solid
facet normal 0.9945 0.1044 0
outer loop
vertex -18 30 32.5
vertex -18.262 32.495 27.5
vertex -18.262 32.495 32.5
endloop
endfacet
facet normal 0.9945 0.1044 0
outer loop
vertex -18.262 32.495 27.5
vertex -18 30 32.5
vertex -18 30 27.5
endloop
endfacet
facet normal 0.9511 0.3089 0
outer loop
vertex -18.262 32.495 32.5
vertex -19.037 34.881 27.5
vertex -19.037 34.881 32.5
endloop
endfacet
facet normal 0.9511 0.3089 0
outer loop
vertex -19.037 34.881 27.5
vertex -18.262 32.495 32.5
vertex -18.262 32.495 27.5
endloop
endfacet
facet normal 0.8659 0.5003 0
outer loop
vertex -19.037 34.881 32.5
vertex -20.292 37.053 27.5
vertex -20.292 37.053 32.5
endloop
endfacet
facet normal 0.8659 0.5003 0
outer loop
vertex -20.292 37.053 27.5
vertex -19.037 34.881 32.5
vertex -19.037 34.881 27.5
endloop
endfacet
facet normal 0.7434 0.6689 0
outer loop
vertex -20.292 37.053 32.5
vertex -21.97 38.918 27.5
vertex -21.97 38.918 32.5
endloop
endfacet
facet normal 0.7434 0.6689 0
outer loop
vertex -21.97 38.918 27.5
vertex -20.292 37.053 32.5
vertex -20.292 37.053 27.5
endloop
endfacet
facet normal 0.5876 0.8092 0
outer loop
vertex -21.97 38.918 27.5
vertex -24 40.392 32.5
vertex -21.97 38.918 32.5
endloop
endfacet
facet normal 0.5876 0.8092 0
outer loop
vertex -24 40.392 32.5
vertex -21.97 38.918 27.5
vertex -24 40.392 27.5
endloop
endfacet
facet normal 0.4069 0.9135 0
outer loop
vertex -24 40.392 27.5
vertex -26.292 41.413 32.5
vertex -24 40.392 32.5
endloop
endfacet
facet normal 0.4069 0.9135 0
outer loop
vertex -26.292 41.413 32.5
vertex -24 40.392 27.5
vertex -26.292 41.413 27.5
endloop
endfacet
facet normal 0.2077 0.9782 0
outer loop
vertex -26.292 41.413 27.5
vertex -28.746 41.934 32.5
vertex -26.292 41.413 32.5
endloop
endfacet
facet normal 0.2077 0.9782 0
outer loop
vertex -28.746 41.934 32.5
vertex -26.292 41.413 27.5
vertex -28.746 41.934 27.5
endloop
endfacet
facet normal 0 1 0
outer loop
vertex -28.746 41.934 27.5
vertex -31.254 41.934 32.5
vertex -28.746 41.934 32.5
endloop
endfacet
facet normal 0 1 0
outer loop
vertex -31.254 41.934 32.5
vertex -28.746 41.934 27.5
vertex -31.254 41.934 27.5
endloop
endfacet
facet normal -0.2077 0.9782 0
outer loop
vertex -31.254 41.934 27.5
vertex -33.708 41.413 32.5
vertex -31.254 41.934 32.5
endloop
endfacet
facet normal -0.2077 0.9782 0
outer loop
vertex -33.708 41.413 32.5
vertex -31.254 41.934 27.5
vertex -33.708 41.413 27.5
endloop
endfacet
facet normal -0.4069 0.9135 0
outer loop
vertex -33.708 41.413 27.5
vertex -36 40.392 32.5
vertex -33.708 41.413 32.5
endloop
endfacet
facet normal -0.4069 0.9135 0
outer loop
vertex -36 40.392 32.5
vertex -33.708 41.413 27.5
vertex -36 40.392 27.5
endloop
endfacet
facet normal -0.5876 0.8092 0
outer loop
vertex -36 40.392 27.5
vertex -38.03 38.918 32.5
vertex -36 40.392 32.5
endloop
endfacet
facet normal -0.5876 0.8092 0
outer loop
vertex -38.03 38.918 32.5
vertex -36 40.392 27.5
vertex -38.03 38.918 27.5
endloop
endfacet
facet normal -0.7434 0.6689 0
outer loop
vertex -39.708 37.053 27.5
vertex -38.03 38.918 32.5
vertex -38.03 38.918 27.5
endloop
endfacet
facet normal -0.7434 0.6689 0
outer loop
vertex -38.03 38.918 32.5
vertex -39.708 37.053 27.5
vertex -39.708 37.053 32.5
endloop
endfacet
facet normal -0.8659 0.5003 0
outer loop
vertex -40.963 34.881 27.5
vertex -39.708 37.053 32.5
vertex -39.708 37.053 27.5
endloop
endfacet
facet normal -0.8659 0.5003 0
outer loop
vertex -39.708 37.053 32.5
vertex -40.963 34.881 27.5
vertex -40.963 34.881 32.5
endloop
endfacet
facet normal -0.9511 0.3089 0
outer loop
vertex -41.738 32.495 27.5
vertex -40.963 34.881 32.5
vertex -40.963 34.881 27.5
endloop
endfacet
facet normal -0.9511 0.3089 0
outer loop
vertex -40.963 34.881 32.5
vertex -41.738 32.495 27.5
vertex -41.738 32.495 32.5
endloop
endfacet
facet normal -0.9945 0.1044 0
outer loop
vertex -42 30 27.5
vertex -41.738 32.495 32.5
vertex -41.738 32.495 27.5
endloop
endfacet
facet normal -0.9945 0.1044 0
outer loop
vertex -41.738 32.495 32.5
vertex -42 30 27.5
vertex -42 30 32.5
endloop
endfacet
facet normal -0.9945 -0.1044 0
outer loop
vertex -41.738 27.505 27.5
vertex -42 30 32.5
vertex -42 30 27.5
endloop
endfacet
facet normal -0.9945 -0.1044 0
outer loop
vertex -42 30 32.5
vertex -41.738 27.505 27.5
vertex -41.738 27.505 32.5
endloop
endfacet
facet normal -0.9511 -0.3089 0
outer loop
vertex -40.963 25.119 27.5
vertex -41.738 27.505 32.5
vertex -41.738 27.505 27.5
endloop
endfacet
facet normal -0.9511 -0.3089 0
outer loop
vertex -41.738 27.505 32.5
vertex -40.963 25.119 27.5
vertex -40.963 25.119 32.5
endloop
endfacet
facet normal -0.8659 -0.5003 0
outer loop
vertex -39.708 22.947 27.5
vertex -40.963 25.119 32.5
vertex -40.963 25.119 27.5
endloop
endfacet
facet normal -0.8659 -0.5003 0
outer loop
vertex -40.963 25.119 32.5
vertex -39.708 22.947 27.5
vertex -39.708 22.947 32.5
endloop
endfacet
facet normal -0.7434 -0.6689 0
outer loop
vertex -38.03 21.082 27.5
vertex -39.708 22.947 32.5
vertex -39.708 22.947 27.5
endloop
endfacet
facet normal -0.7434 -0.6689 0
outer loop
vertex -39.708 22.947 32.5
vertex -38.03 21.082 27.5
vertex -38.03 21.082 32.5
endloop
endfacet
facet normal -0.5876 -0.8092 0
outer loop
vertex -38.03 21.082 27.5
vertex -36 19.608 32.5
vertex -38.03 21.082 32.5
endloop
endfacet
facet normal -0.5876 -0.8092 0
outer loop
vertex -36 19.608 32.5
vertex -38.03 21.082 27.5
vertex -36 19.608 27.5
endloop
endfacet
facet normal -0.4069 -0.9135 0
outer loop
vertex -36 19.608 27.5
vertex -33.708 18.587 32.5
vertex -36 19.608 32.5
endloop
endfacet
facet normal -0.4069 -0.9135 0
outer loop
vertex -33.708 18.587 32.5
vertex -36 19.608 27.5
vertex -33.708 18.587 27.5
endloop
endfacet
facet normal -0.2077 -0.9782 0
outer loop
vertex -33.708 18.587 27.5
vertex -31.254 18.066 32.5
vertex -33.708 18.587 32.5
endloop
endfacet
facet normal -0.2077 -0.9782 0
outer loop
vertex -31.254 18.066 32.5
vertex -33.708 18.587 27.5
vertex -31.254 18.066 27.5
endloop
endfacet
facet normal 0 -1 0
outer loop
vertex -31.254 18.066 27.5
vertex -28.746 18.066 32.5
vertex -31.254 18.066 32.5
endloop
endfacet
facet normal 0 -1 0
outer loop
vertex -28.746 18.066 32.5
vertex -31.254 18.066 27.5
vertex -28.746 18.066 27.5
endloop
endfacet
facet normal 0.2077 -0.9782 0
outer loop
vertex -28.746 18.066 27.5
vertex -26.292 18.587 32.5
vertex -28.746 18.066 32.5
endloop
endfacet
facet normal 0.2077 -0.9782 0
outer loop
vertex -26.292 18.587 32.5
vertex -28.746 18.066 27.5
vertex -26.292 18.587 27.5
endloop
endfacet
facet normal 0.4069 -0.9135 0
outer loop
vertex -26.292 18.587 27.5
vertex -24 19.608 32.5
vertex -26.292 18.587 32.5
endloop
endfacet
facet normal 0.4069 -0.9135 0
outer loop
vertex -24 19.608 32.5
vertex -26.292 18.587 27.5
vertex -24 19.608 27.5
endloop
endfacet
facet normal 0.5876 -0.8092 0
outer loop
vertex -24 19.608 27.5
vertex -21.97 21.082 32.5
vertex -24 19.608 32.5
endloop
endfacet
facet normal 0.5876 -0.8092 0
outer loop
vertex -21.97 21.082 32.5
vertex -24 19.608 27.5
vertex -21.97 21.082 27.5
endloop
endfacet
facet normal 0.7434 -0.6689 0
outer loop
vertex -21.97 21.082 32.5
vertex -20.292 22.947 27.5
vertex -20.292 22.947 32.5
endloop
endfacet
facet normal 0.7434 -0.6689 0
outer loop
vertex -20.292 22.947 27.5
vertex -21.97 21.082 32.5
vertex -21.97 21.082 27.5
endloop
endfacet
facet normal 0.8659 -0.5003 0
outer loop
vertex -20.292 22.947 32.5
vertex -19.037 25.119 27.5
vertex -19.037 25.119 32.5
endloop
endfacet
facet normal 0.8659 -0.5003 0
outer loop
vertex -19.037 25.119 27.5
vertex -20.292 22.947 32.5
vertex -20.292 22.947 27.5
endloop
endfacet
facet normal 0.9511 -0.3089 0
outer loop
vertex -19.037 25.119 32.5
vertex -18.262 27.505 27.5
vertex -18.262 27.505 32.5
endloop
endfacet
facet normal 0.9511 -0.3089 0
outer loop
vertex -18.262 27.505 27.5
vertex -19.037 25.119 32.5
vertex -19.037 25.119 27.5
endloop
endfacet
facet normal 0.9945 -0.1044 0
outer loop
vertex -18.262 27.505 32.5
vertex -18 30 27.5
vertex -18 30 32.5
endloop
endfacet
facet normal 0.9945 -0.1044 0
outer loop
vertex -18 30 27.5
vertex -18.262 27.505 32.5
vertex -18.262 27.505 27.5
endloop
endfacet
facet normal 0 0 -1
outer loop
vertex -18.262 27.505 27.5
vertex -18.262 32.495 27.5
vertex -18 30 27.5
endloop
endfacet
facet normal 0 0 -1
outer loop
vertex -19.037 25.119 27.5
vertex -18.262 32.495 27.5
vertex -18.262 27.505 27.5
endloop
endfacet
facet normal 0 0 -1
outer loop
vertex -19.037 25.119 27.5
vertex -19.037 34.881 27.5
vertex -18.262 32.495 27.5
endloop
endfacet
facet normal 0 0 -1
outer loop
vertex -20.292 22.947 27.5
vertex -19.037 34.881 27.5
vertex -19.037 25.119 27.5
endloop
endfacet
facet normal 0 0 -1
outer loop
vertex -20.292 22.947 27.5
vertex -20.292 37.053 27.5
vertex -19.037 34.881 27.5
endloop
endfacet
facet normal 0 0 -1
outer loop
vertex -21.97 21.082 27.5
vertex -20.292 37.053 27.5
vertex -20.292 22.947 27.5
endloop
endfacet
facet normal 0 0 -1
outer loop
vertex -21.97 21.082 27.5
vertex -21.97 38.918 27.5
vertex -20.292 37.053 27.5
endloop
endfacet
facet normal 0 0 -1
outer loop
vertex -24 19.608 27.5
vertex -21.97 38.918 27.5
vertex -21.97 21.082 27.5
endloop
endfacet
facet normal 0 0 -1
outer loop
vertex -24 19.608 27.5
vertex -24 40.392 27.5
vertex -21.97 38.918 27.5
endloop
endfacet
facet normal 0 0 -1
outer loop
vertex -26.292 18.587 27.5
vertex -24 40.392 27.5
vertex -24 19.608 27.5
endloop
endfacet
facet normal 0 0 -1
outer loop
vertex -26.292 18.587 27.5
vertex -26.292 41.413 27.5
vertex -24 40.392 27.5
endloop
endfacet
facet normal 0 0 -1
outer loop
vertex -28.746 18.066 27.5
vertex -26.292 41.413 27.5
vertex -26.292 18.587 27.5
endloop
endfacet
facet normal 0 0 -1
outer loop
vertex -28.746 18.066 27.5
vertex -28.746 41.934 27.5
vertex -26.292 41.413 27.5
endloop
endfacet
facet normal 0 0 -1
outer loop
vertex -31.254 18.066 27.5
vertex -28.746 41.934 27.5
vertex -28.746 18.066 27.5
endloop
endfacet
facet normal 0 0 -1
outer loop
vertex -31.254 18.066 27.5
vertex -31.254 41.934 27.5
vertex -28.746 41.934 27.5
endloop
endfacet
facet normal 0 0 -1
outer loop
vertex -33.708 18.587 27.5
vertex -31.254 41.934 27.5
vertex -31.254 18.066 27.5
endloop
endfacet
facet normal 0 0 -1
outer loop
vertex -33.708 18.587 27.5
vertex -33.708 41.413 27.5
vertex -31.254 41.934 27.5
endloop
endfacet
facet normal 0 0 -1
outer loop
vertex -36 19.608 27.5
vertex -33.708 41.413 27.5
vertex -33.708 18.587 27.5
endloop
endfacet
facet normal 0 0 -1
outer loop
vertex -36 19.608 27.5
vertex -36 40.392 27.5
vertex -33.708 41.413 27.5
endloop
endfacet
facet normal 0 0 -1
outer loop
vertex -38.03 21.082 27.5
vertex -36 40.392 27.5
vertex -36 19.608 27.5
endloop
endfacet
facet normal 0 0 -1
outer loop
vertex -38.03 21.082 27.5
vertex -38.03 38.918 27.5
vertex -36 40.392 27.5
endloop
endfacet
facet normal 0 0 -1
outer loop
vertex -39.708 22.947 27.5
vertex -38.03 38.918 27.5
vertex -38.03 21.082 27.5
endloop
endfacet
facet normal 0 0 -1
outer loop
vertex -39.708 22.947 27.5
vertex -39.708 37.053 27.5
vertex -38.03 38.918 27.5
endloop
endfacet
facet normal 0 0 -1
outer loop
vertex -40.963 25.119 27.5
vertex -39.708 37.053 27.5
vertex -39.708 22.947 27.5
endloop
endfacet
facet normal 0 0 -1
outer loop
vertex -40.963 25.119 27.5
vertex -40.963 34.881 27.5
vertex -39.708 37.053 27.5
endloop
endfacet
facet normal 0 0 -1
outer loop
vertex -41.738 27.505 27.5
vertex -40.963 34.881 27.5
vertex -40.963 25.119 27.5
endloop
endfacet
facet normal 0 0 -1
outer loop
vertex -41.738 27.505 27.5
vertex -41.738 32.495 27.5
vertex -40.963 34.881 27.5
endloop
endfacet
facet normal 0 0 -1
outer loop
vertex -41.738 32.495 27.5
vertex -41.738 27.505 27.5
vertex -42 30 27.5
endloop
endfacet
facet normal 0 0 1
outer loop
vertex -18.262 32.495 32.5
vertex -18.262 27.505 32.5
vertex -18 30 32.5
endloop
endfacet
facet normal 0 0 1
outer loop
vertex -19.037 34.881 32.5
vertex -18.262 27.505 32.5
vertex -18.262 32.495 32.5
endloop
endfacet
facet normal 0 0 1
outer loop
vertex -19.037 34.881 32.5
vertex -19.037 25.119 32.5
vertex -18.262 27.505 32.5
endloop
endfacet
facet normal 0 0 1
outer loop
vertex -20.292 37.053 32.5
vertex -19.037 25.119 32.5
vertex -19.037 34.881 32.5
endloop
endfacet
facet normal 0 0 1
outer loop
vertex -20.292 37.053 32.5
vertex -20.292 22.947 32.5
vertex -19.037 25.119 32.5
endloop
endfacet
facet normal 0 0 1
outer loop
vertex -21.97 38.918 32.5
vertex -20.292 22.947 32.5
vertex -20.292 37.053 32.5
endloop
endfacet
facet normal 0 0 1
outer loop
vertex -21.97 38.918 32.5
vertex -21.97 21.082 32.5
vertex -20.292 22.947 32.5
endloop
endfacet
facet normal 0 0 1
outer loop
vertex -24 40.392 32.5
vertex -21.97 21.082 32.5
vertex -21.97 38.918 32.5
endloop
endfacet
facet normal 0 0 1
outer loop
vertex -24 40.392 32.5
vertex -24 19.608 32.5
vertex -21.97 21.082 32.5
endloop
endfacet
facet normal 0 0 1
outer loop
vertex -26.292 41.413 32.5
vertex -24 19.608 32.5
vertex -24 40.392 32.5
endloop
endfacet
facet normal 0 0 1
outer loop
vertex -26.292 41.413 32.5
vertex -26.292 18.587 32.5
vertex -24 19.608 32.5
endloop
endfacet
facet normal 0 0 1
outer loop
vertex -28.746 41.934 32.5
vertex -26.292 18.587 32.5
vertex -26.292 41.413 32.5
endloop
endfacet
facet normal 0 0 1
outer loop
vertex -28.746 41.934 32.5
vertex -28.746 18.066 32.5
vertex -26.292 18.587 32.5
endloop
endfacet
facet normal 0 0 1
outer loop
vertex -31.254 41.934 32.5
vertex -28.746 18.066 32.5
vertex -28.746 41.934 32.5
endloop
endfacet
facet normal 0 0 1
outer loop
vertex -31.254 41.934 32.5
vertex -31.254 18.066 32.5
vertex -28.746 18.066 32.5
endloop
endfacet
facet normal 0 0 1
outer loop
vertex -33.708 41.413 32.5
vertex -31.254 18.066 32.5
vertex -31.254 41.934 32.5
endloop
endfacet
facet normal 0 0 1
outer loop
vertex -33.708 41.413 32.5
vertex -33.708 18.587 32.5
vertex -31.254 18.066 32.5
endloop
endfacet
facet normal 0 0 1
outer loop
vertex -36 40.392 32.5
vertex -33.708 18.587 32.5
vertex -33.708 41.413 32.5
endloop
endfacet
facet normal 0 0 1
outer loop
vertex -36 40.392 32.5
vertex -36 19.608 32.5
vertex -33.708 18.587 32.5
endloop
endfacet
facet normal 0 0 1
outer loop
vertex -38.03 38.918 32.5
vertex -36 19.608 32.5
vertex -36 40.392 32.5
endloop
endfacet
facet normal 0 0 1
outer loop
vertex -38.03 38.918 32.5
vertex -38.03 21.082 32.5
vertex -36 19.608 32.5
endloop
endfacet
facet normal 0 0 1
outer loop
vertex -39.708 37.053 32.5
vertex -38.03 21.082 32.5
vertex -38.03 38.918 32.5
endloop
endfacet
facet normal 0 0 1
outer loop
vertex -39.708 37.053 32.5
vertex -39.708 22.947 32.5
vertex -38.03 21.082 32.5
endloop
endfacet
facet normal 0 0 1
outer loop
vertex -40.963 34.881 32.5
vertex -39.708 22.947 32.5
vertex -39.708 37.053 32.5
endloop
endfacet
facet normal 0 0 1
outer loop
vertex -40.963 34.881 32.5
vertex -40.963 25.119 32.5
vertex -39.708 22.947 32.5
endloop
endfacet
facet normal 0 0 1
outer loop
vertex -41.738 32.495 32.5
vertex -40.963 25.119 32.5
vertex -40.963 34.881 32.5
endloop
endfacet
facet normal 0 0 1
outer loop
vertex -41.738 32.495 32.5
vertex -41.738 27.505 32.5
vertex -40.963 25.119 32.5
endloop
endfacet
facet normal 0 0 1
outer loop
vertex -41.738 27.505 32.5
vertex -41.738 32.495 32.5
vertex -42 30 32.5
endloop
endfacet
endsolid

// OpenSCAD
// Generated by generate_scads.py
translate([-30,30,30]) {
  cylinder(h=5, r=12, center=true);
}
